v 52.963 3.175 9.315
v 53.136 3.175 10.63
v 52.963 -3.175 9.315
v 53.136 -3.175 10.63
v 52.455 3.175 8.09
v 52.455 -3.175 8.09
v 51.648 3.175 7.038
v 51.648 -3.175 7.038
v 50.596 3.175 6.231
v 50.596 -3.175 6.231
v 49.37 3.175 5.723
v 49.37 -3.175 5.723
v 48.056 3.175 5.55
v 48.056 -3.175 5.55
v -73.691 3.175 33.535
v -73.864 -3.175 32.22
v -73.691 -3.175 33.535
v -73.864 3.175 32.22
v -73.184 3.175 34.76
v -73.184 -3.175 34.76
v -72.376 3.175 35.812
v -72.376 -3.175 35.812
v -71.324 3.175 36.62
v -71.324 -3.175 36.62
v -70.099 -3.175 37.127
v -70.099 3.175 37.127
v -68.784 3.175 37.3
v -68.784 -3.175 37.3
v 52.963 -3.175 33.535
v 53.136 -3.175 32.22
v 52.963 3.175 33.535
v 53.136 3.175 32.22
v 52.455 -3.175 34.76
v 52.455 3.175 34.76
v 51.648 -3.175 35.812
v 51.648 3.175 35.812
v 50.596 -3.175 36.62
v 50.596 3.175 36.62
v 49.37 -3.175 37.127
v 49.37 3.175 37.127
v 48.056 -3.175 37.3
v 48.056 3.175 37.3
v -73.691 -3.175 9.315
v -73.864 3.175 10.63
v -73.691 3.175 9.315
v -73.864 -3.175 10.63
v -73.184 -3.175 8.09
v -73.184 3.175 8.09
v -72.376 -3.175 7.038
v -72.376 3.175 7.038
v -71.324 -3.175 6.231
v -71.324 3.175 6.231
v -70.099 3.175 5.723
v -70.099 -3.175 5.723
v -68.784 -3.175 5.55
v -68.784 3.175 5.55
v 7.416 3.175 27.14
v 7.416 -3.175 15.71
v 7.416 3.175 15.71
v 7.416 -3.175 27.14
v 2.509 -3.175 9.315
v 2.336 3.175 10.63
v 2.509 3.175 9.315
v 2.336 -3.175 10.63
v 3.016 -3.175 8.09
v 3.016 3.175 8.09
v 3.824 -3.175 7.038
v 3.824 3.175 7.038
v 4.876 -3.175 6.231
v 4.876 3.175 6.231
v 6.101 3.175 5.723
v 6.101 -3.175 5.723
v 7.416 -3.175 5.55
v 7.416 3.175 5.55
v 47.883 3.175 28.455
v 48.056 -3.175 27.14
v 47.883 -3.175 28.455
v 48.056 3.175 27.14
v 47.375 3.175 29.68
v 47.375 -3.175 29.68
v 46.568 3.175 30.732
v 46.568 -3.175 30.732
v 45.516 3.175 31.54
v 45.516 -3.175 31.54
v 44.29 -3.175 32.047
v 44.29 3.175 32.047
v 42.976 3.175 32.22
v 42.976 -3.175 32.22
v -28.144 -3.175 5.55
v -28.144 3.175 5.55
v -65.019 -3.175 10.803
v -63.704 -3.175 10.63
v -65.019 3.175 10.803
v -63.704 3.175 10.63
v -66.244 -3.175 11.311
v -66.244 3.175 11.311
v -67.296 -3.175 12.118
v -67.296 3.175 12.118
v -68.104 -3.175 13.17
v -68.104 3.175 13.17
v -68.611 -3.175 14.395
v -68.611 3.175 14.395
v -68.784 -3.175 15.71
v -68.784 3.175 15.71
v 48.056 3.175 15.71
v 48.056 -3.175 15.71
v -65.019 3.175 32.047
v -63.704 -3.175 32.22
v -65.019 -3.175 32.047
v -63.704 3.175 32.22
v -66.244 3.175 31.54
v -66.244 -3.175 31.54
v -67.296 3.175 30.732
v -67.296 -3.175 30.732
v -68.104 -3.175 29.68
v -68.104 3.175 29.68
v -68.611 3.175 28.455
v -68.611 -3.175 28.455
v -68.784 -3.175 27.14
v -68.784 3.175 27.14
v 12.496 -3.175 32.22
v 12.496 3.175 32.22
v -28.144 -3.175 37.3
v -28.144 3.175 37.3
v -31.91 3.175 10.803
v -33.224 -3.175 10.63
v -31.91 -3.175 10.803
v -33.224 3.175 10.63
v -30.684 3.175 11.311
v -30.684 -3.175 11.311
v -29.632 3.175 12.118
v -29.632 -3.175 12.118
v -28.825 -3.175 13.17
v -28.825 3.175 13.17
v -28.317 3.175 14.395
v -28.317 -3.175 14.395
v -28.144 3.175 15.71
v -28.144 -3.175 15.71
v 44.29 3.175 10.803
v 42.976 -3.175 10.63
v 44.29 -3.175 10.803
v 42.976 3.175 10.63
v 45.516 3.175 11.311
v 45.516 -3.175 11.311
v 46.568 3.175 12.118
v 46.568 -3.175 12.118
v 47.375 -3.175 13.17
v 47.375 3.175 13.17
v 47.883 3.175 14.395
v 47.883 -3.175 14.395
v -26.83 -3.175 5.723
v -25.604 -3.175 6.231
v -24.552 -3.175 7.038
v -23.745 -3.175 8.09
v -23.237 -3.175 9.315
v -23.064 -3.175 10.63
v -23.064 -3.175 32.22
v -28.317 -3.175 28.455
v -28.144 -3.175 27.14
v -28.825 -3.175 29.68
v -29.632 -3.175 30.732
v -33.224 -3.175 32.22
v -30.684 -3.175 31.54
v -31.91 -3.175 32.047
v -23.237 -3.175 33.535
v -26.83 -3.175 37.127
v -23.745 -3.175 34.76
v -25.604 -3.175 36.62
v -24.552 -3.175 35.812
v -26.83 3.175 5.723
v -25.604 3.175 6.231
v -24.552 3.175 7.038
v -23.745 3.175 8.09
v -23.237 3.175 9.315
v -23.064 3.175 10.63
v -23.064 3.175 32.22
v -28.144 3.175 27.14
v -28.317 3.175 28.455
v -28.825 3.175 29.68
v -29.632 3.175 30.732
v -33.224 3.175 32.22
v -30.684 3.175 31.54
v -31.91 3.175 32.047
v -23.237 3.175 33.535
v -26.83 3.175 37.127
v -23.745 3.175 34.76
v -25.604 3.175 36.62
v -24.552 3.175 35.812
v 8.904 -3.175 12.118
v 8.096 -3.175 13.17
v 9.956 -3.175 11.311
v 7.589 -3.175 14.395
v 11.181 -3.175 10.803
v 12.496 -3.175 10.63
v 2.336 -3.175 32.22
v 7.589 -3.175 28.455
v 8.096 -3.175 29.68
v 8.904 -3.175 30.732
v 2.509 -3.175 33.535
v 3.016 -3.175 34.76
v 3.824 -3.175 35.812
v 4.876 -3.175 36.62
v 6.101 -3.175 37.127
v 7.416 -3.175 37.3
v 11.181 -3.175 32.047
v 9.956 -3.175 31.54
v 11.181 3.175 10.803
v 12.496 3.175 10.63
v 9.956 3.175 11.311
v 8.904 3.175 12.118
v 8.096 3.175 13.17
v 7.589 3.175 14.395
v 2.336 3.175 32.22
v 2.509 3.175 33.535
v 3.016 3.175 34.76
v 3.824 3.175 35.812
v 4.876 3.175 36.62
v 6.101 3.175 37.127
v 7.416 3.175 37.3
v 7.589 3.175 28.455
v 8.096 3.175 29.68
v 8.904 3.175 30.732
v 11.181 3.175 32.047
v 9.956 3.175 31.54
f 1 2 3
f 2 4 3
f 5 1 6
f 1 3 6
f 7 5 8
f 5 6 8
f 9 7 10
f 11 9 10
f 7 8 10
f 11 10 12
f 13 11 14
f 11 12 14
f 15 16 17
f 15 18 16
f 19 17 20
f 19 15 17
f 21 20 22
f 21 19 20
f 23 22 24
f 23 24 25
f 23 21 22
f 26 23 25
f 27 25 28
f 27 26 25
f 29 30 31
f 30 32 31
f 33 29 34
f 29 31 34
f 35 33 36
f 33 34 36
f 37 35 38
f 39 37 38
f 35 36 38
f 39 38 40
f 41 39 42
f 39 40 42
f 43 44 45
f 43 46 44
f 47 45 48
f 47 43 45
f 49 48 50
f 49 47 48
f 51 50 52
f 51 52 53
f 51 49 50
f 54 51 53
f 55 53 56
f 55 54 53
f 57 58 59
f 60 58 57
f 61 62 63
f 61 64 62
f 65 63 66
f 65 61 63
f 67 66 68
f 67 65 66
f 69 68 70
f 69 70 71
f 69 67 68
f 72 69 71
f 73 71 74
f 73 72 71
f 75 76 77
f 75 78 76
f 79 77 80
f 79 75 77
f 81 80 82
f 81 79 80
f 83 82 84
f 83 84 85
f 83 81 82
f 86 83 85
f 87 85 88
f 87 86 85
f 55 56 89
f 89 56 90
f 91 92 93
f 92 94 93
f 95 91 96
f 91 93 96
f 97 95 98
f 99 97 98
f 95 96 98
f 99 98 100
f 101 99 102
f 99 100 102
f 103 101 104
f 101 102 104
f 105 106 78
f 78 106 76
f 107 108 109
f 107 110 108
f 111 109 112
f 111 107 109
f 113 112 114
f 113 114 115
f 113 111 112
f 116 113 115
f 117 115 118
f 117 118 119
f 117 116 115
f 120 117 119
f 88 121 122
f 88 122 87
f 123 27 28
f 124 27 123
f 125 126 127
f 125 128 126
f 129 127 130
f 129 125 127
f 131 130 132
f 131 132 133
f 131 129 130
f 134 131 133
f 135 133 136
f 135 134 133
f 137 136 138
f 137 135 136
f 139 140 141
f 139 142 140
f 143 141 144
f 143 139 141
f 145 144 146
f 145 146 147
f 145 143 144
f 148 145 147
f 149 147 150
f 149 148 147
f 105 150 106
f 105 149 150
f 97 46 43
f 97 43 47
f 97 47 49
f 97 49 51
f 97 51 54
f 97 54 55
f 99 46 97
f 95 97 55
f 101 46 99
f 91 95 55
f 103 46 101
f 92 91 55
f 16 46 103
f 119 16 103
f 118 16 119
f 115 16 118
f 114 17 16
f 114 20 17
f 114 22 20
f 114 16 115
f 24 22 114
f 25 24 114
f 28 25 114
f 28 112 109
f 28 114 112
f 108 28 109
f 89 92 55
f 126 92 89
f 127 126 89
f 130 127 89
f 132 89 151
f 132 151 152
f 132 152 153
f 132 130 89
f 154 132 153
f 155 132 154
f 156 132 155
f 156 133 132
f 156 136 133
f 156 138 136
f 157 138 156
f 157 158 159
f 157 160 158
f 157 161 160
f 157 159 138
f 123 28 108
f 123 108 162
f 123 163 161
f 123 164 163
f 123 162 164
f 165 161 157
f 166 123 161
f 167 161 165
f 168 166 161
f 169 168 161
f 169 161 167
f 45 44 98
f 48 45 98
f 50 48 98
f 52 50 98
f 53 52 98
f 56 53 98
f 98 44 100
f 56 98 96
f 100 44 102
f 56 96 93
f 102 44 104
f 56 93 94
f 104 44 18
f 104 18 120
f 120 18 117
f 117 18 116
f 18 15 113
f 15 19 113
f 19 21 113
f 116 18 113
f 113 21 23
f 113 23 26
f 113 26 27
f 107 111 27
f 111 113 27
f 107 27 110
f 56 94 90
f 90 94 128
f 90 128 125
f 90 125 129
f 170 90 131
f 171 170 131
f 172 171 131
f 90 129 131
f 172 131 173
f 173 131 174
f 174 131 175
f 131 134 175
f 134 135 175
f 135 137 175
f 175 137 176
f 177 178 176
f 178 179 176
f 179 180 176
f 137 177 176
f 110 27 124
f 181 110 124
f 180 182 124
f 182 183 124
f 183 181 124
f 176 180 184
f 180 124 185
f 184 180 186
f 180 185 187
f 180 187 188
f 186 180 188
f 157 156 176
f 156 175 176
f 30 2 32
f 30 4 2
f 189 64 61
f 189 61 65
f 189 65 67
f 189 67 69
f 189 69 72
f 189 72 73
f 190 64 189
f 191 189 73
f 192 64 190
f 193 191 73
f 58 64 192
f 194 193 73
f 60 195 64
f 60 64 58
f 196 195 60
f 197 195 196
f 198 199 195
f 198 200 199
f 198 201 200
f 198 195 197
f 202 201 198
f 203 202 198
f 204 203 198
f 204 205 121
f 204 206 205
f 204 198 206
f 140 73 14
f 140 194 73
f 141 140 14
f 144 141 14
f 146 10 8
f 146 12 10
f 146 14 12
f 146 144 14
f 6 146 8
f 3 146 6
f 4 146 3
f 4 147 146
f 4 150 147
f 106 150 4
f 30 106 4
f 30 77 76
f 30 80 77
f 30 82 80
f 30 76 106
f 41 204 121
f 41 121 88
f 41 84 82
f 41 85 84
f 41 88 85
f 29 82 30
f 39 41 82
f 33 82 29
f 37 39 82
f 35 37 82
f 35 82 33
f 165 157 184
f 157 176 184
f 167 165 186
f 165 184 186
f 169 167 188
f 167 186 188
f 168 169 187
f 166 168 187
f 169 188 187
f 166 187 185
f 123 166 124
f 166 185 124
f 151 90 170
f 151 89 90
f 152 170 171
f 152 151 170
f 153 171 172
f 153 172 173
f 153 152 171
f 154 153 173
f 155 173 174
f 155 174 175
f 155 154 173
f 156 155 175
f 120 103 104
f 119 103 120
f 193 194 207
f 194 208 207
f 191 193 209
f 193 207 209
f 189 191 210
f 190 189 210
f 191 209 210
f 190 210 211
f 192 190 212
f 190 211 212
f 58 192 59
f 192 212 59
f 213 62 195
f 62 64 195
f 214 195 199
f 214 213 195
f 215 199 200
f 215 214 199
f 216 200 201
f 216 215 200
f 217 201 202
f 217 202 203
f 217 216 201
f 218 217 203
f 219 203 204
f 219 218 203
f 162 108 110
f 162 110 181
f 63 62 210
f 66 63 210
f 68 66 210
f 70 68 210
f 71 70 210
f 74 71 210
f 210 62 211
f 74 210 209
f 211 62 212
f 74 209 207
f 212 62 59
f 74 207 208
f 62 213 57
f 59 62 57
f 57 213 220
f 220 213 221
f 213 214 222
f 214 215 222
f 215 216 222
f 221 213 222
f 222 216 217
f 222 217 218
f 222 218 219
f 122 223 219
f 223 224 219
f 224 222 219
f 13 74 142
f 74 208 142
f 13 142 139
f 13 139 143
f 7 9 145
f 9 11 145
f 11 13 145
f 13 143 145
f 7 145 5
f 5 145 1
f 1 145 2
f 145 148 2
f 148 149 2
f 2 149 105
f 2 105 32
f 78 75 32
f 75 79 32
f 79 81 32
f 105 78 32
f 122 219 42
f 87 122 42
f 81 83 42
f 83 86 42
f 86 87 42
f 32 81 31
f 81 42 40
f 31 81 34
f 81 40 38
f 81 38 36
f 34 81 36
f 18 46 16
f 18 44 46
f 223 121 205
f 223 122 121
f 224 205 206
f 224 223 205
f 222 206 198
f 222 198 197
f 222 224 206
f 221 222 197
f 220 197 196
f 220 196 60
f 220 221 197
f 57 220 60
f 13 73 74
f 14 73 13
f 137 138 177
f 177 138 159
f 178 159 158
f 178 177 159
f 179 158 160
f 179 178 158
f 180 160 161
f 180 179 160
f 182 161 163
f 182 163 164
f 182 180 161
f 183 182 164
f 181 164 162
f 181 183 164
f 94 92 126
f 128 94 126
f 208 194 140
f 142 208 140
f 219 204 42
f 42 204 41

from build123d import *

# Parameters (mm, degrees)
F0_W     = 50.8
F0_H     = 31.75
F1_DEPTH = 3.175
F2_R     = 5.08
F3_W     = 40.64
F3_H     = 21.59
F4_DEPTH = 25.4
F5_R     = 5.08
F6_W     = 40.64
F6_H     = 21.59
F7_DEPTH = 25.4
F8_R     = 5.08


with BuildPart() as f1:
    # F0 (on Front) → F1 (new body, symmetric)
    with BuildSketch(Plane.XZ):
        with Locations((-48.464361, 21.425134)):
            Rectangle(F0_W, F0_H)
        with Locations((27.735639, 21.425134)):
            Rectangle(F0_W, F0_H)
    extrude(amount=F1_DEPTH, both=True)

    # F2
    f2_edges = [f1.edges().sort_by_distance(p)[0] for p in [
        (-73.864361, 0, 37.300134),
        (-73.864361, 0, 5.550134),
        (-23.064361, 0, 5.550134),
        (-23.064361, 0, 37.300134),
        (2.335639, 0, 37.300134),
        (53.135639, 0, 37.300134),
        (53.135639, 0, 5.550134),
        (2.335639, 0, 5.550134),
    ]]
    fillet(f2_edges, radius=F2_R)

    # F3 (on face) → F4 (cut)
    with BuildSketch(Plane.XZ.offset(3.175)):
        with Locations((-48.464361, 21.425134)):
            Rectangle(F3_W, F3_H)
    extrude(amount=-F4_DEPTH, mode=Mode.SUBTRACT)

    # F5
    f5_edges = [f1.edges().sort_by_distance(p)[0] for p in [
        (-28.144361, 0, 32.220134),
        (-68.784361, 0, 10.630134),
        (-68.784361, 0, 32.220134),
        (-28.144361, 0, 10.630134),
    ]]
    fillet(f5_edges, radius=F5_R)

    # F6 (on face) → F7 (cut)
    with BuildSketch(Plane.XZ.offset(3.175)):
        with Locations((27.735639, 21.425134)):
            Rectangle(F6_W, F6_H)
    extrude(amount=-F7_DEPTH, mode=Mode.SUBTRACT)

    # F8
    f8_edges = [f1.edges().sort_by_distance(p)[0] for p in [
        (48.055639, 0, 10.630134),
        (7.415639, 0, 10.630134),
        (7.415639, 0, 32.220134),
        (48.055639, 0, 32.220134),
    ]]
    fillet(f8_edges, radius=F8_R)


solid = f1.part
